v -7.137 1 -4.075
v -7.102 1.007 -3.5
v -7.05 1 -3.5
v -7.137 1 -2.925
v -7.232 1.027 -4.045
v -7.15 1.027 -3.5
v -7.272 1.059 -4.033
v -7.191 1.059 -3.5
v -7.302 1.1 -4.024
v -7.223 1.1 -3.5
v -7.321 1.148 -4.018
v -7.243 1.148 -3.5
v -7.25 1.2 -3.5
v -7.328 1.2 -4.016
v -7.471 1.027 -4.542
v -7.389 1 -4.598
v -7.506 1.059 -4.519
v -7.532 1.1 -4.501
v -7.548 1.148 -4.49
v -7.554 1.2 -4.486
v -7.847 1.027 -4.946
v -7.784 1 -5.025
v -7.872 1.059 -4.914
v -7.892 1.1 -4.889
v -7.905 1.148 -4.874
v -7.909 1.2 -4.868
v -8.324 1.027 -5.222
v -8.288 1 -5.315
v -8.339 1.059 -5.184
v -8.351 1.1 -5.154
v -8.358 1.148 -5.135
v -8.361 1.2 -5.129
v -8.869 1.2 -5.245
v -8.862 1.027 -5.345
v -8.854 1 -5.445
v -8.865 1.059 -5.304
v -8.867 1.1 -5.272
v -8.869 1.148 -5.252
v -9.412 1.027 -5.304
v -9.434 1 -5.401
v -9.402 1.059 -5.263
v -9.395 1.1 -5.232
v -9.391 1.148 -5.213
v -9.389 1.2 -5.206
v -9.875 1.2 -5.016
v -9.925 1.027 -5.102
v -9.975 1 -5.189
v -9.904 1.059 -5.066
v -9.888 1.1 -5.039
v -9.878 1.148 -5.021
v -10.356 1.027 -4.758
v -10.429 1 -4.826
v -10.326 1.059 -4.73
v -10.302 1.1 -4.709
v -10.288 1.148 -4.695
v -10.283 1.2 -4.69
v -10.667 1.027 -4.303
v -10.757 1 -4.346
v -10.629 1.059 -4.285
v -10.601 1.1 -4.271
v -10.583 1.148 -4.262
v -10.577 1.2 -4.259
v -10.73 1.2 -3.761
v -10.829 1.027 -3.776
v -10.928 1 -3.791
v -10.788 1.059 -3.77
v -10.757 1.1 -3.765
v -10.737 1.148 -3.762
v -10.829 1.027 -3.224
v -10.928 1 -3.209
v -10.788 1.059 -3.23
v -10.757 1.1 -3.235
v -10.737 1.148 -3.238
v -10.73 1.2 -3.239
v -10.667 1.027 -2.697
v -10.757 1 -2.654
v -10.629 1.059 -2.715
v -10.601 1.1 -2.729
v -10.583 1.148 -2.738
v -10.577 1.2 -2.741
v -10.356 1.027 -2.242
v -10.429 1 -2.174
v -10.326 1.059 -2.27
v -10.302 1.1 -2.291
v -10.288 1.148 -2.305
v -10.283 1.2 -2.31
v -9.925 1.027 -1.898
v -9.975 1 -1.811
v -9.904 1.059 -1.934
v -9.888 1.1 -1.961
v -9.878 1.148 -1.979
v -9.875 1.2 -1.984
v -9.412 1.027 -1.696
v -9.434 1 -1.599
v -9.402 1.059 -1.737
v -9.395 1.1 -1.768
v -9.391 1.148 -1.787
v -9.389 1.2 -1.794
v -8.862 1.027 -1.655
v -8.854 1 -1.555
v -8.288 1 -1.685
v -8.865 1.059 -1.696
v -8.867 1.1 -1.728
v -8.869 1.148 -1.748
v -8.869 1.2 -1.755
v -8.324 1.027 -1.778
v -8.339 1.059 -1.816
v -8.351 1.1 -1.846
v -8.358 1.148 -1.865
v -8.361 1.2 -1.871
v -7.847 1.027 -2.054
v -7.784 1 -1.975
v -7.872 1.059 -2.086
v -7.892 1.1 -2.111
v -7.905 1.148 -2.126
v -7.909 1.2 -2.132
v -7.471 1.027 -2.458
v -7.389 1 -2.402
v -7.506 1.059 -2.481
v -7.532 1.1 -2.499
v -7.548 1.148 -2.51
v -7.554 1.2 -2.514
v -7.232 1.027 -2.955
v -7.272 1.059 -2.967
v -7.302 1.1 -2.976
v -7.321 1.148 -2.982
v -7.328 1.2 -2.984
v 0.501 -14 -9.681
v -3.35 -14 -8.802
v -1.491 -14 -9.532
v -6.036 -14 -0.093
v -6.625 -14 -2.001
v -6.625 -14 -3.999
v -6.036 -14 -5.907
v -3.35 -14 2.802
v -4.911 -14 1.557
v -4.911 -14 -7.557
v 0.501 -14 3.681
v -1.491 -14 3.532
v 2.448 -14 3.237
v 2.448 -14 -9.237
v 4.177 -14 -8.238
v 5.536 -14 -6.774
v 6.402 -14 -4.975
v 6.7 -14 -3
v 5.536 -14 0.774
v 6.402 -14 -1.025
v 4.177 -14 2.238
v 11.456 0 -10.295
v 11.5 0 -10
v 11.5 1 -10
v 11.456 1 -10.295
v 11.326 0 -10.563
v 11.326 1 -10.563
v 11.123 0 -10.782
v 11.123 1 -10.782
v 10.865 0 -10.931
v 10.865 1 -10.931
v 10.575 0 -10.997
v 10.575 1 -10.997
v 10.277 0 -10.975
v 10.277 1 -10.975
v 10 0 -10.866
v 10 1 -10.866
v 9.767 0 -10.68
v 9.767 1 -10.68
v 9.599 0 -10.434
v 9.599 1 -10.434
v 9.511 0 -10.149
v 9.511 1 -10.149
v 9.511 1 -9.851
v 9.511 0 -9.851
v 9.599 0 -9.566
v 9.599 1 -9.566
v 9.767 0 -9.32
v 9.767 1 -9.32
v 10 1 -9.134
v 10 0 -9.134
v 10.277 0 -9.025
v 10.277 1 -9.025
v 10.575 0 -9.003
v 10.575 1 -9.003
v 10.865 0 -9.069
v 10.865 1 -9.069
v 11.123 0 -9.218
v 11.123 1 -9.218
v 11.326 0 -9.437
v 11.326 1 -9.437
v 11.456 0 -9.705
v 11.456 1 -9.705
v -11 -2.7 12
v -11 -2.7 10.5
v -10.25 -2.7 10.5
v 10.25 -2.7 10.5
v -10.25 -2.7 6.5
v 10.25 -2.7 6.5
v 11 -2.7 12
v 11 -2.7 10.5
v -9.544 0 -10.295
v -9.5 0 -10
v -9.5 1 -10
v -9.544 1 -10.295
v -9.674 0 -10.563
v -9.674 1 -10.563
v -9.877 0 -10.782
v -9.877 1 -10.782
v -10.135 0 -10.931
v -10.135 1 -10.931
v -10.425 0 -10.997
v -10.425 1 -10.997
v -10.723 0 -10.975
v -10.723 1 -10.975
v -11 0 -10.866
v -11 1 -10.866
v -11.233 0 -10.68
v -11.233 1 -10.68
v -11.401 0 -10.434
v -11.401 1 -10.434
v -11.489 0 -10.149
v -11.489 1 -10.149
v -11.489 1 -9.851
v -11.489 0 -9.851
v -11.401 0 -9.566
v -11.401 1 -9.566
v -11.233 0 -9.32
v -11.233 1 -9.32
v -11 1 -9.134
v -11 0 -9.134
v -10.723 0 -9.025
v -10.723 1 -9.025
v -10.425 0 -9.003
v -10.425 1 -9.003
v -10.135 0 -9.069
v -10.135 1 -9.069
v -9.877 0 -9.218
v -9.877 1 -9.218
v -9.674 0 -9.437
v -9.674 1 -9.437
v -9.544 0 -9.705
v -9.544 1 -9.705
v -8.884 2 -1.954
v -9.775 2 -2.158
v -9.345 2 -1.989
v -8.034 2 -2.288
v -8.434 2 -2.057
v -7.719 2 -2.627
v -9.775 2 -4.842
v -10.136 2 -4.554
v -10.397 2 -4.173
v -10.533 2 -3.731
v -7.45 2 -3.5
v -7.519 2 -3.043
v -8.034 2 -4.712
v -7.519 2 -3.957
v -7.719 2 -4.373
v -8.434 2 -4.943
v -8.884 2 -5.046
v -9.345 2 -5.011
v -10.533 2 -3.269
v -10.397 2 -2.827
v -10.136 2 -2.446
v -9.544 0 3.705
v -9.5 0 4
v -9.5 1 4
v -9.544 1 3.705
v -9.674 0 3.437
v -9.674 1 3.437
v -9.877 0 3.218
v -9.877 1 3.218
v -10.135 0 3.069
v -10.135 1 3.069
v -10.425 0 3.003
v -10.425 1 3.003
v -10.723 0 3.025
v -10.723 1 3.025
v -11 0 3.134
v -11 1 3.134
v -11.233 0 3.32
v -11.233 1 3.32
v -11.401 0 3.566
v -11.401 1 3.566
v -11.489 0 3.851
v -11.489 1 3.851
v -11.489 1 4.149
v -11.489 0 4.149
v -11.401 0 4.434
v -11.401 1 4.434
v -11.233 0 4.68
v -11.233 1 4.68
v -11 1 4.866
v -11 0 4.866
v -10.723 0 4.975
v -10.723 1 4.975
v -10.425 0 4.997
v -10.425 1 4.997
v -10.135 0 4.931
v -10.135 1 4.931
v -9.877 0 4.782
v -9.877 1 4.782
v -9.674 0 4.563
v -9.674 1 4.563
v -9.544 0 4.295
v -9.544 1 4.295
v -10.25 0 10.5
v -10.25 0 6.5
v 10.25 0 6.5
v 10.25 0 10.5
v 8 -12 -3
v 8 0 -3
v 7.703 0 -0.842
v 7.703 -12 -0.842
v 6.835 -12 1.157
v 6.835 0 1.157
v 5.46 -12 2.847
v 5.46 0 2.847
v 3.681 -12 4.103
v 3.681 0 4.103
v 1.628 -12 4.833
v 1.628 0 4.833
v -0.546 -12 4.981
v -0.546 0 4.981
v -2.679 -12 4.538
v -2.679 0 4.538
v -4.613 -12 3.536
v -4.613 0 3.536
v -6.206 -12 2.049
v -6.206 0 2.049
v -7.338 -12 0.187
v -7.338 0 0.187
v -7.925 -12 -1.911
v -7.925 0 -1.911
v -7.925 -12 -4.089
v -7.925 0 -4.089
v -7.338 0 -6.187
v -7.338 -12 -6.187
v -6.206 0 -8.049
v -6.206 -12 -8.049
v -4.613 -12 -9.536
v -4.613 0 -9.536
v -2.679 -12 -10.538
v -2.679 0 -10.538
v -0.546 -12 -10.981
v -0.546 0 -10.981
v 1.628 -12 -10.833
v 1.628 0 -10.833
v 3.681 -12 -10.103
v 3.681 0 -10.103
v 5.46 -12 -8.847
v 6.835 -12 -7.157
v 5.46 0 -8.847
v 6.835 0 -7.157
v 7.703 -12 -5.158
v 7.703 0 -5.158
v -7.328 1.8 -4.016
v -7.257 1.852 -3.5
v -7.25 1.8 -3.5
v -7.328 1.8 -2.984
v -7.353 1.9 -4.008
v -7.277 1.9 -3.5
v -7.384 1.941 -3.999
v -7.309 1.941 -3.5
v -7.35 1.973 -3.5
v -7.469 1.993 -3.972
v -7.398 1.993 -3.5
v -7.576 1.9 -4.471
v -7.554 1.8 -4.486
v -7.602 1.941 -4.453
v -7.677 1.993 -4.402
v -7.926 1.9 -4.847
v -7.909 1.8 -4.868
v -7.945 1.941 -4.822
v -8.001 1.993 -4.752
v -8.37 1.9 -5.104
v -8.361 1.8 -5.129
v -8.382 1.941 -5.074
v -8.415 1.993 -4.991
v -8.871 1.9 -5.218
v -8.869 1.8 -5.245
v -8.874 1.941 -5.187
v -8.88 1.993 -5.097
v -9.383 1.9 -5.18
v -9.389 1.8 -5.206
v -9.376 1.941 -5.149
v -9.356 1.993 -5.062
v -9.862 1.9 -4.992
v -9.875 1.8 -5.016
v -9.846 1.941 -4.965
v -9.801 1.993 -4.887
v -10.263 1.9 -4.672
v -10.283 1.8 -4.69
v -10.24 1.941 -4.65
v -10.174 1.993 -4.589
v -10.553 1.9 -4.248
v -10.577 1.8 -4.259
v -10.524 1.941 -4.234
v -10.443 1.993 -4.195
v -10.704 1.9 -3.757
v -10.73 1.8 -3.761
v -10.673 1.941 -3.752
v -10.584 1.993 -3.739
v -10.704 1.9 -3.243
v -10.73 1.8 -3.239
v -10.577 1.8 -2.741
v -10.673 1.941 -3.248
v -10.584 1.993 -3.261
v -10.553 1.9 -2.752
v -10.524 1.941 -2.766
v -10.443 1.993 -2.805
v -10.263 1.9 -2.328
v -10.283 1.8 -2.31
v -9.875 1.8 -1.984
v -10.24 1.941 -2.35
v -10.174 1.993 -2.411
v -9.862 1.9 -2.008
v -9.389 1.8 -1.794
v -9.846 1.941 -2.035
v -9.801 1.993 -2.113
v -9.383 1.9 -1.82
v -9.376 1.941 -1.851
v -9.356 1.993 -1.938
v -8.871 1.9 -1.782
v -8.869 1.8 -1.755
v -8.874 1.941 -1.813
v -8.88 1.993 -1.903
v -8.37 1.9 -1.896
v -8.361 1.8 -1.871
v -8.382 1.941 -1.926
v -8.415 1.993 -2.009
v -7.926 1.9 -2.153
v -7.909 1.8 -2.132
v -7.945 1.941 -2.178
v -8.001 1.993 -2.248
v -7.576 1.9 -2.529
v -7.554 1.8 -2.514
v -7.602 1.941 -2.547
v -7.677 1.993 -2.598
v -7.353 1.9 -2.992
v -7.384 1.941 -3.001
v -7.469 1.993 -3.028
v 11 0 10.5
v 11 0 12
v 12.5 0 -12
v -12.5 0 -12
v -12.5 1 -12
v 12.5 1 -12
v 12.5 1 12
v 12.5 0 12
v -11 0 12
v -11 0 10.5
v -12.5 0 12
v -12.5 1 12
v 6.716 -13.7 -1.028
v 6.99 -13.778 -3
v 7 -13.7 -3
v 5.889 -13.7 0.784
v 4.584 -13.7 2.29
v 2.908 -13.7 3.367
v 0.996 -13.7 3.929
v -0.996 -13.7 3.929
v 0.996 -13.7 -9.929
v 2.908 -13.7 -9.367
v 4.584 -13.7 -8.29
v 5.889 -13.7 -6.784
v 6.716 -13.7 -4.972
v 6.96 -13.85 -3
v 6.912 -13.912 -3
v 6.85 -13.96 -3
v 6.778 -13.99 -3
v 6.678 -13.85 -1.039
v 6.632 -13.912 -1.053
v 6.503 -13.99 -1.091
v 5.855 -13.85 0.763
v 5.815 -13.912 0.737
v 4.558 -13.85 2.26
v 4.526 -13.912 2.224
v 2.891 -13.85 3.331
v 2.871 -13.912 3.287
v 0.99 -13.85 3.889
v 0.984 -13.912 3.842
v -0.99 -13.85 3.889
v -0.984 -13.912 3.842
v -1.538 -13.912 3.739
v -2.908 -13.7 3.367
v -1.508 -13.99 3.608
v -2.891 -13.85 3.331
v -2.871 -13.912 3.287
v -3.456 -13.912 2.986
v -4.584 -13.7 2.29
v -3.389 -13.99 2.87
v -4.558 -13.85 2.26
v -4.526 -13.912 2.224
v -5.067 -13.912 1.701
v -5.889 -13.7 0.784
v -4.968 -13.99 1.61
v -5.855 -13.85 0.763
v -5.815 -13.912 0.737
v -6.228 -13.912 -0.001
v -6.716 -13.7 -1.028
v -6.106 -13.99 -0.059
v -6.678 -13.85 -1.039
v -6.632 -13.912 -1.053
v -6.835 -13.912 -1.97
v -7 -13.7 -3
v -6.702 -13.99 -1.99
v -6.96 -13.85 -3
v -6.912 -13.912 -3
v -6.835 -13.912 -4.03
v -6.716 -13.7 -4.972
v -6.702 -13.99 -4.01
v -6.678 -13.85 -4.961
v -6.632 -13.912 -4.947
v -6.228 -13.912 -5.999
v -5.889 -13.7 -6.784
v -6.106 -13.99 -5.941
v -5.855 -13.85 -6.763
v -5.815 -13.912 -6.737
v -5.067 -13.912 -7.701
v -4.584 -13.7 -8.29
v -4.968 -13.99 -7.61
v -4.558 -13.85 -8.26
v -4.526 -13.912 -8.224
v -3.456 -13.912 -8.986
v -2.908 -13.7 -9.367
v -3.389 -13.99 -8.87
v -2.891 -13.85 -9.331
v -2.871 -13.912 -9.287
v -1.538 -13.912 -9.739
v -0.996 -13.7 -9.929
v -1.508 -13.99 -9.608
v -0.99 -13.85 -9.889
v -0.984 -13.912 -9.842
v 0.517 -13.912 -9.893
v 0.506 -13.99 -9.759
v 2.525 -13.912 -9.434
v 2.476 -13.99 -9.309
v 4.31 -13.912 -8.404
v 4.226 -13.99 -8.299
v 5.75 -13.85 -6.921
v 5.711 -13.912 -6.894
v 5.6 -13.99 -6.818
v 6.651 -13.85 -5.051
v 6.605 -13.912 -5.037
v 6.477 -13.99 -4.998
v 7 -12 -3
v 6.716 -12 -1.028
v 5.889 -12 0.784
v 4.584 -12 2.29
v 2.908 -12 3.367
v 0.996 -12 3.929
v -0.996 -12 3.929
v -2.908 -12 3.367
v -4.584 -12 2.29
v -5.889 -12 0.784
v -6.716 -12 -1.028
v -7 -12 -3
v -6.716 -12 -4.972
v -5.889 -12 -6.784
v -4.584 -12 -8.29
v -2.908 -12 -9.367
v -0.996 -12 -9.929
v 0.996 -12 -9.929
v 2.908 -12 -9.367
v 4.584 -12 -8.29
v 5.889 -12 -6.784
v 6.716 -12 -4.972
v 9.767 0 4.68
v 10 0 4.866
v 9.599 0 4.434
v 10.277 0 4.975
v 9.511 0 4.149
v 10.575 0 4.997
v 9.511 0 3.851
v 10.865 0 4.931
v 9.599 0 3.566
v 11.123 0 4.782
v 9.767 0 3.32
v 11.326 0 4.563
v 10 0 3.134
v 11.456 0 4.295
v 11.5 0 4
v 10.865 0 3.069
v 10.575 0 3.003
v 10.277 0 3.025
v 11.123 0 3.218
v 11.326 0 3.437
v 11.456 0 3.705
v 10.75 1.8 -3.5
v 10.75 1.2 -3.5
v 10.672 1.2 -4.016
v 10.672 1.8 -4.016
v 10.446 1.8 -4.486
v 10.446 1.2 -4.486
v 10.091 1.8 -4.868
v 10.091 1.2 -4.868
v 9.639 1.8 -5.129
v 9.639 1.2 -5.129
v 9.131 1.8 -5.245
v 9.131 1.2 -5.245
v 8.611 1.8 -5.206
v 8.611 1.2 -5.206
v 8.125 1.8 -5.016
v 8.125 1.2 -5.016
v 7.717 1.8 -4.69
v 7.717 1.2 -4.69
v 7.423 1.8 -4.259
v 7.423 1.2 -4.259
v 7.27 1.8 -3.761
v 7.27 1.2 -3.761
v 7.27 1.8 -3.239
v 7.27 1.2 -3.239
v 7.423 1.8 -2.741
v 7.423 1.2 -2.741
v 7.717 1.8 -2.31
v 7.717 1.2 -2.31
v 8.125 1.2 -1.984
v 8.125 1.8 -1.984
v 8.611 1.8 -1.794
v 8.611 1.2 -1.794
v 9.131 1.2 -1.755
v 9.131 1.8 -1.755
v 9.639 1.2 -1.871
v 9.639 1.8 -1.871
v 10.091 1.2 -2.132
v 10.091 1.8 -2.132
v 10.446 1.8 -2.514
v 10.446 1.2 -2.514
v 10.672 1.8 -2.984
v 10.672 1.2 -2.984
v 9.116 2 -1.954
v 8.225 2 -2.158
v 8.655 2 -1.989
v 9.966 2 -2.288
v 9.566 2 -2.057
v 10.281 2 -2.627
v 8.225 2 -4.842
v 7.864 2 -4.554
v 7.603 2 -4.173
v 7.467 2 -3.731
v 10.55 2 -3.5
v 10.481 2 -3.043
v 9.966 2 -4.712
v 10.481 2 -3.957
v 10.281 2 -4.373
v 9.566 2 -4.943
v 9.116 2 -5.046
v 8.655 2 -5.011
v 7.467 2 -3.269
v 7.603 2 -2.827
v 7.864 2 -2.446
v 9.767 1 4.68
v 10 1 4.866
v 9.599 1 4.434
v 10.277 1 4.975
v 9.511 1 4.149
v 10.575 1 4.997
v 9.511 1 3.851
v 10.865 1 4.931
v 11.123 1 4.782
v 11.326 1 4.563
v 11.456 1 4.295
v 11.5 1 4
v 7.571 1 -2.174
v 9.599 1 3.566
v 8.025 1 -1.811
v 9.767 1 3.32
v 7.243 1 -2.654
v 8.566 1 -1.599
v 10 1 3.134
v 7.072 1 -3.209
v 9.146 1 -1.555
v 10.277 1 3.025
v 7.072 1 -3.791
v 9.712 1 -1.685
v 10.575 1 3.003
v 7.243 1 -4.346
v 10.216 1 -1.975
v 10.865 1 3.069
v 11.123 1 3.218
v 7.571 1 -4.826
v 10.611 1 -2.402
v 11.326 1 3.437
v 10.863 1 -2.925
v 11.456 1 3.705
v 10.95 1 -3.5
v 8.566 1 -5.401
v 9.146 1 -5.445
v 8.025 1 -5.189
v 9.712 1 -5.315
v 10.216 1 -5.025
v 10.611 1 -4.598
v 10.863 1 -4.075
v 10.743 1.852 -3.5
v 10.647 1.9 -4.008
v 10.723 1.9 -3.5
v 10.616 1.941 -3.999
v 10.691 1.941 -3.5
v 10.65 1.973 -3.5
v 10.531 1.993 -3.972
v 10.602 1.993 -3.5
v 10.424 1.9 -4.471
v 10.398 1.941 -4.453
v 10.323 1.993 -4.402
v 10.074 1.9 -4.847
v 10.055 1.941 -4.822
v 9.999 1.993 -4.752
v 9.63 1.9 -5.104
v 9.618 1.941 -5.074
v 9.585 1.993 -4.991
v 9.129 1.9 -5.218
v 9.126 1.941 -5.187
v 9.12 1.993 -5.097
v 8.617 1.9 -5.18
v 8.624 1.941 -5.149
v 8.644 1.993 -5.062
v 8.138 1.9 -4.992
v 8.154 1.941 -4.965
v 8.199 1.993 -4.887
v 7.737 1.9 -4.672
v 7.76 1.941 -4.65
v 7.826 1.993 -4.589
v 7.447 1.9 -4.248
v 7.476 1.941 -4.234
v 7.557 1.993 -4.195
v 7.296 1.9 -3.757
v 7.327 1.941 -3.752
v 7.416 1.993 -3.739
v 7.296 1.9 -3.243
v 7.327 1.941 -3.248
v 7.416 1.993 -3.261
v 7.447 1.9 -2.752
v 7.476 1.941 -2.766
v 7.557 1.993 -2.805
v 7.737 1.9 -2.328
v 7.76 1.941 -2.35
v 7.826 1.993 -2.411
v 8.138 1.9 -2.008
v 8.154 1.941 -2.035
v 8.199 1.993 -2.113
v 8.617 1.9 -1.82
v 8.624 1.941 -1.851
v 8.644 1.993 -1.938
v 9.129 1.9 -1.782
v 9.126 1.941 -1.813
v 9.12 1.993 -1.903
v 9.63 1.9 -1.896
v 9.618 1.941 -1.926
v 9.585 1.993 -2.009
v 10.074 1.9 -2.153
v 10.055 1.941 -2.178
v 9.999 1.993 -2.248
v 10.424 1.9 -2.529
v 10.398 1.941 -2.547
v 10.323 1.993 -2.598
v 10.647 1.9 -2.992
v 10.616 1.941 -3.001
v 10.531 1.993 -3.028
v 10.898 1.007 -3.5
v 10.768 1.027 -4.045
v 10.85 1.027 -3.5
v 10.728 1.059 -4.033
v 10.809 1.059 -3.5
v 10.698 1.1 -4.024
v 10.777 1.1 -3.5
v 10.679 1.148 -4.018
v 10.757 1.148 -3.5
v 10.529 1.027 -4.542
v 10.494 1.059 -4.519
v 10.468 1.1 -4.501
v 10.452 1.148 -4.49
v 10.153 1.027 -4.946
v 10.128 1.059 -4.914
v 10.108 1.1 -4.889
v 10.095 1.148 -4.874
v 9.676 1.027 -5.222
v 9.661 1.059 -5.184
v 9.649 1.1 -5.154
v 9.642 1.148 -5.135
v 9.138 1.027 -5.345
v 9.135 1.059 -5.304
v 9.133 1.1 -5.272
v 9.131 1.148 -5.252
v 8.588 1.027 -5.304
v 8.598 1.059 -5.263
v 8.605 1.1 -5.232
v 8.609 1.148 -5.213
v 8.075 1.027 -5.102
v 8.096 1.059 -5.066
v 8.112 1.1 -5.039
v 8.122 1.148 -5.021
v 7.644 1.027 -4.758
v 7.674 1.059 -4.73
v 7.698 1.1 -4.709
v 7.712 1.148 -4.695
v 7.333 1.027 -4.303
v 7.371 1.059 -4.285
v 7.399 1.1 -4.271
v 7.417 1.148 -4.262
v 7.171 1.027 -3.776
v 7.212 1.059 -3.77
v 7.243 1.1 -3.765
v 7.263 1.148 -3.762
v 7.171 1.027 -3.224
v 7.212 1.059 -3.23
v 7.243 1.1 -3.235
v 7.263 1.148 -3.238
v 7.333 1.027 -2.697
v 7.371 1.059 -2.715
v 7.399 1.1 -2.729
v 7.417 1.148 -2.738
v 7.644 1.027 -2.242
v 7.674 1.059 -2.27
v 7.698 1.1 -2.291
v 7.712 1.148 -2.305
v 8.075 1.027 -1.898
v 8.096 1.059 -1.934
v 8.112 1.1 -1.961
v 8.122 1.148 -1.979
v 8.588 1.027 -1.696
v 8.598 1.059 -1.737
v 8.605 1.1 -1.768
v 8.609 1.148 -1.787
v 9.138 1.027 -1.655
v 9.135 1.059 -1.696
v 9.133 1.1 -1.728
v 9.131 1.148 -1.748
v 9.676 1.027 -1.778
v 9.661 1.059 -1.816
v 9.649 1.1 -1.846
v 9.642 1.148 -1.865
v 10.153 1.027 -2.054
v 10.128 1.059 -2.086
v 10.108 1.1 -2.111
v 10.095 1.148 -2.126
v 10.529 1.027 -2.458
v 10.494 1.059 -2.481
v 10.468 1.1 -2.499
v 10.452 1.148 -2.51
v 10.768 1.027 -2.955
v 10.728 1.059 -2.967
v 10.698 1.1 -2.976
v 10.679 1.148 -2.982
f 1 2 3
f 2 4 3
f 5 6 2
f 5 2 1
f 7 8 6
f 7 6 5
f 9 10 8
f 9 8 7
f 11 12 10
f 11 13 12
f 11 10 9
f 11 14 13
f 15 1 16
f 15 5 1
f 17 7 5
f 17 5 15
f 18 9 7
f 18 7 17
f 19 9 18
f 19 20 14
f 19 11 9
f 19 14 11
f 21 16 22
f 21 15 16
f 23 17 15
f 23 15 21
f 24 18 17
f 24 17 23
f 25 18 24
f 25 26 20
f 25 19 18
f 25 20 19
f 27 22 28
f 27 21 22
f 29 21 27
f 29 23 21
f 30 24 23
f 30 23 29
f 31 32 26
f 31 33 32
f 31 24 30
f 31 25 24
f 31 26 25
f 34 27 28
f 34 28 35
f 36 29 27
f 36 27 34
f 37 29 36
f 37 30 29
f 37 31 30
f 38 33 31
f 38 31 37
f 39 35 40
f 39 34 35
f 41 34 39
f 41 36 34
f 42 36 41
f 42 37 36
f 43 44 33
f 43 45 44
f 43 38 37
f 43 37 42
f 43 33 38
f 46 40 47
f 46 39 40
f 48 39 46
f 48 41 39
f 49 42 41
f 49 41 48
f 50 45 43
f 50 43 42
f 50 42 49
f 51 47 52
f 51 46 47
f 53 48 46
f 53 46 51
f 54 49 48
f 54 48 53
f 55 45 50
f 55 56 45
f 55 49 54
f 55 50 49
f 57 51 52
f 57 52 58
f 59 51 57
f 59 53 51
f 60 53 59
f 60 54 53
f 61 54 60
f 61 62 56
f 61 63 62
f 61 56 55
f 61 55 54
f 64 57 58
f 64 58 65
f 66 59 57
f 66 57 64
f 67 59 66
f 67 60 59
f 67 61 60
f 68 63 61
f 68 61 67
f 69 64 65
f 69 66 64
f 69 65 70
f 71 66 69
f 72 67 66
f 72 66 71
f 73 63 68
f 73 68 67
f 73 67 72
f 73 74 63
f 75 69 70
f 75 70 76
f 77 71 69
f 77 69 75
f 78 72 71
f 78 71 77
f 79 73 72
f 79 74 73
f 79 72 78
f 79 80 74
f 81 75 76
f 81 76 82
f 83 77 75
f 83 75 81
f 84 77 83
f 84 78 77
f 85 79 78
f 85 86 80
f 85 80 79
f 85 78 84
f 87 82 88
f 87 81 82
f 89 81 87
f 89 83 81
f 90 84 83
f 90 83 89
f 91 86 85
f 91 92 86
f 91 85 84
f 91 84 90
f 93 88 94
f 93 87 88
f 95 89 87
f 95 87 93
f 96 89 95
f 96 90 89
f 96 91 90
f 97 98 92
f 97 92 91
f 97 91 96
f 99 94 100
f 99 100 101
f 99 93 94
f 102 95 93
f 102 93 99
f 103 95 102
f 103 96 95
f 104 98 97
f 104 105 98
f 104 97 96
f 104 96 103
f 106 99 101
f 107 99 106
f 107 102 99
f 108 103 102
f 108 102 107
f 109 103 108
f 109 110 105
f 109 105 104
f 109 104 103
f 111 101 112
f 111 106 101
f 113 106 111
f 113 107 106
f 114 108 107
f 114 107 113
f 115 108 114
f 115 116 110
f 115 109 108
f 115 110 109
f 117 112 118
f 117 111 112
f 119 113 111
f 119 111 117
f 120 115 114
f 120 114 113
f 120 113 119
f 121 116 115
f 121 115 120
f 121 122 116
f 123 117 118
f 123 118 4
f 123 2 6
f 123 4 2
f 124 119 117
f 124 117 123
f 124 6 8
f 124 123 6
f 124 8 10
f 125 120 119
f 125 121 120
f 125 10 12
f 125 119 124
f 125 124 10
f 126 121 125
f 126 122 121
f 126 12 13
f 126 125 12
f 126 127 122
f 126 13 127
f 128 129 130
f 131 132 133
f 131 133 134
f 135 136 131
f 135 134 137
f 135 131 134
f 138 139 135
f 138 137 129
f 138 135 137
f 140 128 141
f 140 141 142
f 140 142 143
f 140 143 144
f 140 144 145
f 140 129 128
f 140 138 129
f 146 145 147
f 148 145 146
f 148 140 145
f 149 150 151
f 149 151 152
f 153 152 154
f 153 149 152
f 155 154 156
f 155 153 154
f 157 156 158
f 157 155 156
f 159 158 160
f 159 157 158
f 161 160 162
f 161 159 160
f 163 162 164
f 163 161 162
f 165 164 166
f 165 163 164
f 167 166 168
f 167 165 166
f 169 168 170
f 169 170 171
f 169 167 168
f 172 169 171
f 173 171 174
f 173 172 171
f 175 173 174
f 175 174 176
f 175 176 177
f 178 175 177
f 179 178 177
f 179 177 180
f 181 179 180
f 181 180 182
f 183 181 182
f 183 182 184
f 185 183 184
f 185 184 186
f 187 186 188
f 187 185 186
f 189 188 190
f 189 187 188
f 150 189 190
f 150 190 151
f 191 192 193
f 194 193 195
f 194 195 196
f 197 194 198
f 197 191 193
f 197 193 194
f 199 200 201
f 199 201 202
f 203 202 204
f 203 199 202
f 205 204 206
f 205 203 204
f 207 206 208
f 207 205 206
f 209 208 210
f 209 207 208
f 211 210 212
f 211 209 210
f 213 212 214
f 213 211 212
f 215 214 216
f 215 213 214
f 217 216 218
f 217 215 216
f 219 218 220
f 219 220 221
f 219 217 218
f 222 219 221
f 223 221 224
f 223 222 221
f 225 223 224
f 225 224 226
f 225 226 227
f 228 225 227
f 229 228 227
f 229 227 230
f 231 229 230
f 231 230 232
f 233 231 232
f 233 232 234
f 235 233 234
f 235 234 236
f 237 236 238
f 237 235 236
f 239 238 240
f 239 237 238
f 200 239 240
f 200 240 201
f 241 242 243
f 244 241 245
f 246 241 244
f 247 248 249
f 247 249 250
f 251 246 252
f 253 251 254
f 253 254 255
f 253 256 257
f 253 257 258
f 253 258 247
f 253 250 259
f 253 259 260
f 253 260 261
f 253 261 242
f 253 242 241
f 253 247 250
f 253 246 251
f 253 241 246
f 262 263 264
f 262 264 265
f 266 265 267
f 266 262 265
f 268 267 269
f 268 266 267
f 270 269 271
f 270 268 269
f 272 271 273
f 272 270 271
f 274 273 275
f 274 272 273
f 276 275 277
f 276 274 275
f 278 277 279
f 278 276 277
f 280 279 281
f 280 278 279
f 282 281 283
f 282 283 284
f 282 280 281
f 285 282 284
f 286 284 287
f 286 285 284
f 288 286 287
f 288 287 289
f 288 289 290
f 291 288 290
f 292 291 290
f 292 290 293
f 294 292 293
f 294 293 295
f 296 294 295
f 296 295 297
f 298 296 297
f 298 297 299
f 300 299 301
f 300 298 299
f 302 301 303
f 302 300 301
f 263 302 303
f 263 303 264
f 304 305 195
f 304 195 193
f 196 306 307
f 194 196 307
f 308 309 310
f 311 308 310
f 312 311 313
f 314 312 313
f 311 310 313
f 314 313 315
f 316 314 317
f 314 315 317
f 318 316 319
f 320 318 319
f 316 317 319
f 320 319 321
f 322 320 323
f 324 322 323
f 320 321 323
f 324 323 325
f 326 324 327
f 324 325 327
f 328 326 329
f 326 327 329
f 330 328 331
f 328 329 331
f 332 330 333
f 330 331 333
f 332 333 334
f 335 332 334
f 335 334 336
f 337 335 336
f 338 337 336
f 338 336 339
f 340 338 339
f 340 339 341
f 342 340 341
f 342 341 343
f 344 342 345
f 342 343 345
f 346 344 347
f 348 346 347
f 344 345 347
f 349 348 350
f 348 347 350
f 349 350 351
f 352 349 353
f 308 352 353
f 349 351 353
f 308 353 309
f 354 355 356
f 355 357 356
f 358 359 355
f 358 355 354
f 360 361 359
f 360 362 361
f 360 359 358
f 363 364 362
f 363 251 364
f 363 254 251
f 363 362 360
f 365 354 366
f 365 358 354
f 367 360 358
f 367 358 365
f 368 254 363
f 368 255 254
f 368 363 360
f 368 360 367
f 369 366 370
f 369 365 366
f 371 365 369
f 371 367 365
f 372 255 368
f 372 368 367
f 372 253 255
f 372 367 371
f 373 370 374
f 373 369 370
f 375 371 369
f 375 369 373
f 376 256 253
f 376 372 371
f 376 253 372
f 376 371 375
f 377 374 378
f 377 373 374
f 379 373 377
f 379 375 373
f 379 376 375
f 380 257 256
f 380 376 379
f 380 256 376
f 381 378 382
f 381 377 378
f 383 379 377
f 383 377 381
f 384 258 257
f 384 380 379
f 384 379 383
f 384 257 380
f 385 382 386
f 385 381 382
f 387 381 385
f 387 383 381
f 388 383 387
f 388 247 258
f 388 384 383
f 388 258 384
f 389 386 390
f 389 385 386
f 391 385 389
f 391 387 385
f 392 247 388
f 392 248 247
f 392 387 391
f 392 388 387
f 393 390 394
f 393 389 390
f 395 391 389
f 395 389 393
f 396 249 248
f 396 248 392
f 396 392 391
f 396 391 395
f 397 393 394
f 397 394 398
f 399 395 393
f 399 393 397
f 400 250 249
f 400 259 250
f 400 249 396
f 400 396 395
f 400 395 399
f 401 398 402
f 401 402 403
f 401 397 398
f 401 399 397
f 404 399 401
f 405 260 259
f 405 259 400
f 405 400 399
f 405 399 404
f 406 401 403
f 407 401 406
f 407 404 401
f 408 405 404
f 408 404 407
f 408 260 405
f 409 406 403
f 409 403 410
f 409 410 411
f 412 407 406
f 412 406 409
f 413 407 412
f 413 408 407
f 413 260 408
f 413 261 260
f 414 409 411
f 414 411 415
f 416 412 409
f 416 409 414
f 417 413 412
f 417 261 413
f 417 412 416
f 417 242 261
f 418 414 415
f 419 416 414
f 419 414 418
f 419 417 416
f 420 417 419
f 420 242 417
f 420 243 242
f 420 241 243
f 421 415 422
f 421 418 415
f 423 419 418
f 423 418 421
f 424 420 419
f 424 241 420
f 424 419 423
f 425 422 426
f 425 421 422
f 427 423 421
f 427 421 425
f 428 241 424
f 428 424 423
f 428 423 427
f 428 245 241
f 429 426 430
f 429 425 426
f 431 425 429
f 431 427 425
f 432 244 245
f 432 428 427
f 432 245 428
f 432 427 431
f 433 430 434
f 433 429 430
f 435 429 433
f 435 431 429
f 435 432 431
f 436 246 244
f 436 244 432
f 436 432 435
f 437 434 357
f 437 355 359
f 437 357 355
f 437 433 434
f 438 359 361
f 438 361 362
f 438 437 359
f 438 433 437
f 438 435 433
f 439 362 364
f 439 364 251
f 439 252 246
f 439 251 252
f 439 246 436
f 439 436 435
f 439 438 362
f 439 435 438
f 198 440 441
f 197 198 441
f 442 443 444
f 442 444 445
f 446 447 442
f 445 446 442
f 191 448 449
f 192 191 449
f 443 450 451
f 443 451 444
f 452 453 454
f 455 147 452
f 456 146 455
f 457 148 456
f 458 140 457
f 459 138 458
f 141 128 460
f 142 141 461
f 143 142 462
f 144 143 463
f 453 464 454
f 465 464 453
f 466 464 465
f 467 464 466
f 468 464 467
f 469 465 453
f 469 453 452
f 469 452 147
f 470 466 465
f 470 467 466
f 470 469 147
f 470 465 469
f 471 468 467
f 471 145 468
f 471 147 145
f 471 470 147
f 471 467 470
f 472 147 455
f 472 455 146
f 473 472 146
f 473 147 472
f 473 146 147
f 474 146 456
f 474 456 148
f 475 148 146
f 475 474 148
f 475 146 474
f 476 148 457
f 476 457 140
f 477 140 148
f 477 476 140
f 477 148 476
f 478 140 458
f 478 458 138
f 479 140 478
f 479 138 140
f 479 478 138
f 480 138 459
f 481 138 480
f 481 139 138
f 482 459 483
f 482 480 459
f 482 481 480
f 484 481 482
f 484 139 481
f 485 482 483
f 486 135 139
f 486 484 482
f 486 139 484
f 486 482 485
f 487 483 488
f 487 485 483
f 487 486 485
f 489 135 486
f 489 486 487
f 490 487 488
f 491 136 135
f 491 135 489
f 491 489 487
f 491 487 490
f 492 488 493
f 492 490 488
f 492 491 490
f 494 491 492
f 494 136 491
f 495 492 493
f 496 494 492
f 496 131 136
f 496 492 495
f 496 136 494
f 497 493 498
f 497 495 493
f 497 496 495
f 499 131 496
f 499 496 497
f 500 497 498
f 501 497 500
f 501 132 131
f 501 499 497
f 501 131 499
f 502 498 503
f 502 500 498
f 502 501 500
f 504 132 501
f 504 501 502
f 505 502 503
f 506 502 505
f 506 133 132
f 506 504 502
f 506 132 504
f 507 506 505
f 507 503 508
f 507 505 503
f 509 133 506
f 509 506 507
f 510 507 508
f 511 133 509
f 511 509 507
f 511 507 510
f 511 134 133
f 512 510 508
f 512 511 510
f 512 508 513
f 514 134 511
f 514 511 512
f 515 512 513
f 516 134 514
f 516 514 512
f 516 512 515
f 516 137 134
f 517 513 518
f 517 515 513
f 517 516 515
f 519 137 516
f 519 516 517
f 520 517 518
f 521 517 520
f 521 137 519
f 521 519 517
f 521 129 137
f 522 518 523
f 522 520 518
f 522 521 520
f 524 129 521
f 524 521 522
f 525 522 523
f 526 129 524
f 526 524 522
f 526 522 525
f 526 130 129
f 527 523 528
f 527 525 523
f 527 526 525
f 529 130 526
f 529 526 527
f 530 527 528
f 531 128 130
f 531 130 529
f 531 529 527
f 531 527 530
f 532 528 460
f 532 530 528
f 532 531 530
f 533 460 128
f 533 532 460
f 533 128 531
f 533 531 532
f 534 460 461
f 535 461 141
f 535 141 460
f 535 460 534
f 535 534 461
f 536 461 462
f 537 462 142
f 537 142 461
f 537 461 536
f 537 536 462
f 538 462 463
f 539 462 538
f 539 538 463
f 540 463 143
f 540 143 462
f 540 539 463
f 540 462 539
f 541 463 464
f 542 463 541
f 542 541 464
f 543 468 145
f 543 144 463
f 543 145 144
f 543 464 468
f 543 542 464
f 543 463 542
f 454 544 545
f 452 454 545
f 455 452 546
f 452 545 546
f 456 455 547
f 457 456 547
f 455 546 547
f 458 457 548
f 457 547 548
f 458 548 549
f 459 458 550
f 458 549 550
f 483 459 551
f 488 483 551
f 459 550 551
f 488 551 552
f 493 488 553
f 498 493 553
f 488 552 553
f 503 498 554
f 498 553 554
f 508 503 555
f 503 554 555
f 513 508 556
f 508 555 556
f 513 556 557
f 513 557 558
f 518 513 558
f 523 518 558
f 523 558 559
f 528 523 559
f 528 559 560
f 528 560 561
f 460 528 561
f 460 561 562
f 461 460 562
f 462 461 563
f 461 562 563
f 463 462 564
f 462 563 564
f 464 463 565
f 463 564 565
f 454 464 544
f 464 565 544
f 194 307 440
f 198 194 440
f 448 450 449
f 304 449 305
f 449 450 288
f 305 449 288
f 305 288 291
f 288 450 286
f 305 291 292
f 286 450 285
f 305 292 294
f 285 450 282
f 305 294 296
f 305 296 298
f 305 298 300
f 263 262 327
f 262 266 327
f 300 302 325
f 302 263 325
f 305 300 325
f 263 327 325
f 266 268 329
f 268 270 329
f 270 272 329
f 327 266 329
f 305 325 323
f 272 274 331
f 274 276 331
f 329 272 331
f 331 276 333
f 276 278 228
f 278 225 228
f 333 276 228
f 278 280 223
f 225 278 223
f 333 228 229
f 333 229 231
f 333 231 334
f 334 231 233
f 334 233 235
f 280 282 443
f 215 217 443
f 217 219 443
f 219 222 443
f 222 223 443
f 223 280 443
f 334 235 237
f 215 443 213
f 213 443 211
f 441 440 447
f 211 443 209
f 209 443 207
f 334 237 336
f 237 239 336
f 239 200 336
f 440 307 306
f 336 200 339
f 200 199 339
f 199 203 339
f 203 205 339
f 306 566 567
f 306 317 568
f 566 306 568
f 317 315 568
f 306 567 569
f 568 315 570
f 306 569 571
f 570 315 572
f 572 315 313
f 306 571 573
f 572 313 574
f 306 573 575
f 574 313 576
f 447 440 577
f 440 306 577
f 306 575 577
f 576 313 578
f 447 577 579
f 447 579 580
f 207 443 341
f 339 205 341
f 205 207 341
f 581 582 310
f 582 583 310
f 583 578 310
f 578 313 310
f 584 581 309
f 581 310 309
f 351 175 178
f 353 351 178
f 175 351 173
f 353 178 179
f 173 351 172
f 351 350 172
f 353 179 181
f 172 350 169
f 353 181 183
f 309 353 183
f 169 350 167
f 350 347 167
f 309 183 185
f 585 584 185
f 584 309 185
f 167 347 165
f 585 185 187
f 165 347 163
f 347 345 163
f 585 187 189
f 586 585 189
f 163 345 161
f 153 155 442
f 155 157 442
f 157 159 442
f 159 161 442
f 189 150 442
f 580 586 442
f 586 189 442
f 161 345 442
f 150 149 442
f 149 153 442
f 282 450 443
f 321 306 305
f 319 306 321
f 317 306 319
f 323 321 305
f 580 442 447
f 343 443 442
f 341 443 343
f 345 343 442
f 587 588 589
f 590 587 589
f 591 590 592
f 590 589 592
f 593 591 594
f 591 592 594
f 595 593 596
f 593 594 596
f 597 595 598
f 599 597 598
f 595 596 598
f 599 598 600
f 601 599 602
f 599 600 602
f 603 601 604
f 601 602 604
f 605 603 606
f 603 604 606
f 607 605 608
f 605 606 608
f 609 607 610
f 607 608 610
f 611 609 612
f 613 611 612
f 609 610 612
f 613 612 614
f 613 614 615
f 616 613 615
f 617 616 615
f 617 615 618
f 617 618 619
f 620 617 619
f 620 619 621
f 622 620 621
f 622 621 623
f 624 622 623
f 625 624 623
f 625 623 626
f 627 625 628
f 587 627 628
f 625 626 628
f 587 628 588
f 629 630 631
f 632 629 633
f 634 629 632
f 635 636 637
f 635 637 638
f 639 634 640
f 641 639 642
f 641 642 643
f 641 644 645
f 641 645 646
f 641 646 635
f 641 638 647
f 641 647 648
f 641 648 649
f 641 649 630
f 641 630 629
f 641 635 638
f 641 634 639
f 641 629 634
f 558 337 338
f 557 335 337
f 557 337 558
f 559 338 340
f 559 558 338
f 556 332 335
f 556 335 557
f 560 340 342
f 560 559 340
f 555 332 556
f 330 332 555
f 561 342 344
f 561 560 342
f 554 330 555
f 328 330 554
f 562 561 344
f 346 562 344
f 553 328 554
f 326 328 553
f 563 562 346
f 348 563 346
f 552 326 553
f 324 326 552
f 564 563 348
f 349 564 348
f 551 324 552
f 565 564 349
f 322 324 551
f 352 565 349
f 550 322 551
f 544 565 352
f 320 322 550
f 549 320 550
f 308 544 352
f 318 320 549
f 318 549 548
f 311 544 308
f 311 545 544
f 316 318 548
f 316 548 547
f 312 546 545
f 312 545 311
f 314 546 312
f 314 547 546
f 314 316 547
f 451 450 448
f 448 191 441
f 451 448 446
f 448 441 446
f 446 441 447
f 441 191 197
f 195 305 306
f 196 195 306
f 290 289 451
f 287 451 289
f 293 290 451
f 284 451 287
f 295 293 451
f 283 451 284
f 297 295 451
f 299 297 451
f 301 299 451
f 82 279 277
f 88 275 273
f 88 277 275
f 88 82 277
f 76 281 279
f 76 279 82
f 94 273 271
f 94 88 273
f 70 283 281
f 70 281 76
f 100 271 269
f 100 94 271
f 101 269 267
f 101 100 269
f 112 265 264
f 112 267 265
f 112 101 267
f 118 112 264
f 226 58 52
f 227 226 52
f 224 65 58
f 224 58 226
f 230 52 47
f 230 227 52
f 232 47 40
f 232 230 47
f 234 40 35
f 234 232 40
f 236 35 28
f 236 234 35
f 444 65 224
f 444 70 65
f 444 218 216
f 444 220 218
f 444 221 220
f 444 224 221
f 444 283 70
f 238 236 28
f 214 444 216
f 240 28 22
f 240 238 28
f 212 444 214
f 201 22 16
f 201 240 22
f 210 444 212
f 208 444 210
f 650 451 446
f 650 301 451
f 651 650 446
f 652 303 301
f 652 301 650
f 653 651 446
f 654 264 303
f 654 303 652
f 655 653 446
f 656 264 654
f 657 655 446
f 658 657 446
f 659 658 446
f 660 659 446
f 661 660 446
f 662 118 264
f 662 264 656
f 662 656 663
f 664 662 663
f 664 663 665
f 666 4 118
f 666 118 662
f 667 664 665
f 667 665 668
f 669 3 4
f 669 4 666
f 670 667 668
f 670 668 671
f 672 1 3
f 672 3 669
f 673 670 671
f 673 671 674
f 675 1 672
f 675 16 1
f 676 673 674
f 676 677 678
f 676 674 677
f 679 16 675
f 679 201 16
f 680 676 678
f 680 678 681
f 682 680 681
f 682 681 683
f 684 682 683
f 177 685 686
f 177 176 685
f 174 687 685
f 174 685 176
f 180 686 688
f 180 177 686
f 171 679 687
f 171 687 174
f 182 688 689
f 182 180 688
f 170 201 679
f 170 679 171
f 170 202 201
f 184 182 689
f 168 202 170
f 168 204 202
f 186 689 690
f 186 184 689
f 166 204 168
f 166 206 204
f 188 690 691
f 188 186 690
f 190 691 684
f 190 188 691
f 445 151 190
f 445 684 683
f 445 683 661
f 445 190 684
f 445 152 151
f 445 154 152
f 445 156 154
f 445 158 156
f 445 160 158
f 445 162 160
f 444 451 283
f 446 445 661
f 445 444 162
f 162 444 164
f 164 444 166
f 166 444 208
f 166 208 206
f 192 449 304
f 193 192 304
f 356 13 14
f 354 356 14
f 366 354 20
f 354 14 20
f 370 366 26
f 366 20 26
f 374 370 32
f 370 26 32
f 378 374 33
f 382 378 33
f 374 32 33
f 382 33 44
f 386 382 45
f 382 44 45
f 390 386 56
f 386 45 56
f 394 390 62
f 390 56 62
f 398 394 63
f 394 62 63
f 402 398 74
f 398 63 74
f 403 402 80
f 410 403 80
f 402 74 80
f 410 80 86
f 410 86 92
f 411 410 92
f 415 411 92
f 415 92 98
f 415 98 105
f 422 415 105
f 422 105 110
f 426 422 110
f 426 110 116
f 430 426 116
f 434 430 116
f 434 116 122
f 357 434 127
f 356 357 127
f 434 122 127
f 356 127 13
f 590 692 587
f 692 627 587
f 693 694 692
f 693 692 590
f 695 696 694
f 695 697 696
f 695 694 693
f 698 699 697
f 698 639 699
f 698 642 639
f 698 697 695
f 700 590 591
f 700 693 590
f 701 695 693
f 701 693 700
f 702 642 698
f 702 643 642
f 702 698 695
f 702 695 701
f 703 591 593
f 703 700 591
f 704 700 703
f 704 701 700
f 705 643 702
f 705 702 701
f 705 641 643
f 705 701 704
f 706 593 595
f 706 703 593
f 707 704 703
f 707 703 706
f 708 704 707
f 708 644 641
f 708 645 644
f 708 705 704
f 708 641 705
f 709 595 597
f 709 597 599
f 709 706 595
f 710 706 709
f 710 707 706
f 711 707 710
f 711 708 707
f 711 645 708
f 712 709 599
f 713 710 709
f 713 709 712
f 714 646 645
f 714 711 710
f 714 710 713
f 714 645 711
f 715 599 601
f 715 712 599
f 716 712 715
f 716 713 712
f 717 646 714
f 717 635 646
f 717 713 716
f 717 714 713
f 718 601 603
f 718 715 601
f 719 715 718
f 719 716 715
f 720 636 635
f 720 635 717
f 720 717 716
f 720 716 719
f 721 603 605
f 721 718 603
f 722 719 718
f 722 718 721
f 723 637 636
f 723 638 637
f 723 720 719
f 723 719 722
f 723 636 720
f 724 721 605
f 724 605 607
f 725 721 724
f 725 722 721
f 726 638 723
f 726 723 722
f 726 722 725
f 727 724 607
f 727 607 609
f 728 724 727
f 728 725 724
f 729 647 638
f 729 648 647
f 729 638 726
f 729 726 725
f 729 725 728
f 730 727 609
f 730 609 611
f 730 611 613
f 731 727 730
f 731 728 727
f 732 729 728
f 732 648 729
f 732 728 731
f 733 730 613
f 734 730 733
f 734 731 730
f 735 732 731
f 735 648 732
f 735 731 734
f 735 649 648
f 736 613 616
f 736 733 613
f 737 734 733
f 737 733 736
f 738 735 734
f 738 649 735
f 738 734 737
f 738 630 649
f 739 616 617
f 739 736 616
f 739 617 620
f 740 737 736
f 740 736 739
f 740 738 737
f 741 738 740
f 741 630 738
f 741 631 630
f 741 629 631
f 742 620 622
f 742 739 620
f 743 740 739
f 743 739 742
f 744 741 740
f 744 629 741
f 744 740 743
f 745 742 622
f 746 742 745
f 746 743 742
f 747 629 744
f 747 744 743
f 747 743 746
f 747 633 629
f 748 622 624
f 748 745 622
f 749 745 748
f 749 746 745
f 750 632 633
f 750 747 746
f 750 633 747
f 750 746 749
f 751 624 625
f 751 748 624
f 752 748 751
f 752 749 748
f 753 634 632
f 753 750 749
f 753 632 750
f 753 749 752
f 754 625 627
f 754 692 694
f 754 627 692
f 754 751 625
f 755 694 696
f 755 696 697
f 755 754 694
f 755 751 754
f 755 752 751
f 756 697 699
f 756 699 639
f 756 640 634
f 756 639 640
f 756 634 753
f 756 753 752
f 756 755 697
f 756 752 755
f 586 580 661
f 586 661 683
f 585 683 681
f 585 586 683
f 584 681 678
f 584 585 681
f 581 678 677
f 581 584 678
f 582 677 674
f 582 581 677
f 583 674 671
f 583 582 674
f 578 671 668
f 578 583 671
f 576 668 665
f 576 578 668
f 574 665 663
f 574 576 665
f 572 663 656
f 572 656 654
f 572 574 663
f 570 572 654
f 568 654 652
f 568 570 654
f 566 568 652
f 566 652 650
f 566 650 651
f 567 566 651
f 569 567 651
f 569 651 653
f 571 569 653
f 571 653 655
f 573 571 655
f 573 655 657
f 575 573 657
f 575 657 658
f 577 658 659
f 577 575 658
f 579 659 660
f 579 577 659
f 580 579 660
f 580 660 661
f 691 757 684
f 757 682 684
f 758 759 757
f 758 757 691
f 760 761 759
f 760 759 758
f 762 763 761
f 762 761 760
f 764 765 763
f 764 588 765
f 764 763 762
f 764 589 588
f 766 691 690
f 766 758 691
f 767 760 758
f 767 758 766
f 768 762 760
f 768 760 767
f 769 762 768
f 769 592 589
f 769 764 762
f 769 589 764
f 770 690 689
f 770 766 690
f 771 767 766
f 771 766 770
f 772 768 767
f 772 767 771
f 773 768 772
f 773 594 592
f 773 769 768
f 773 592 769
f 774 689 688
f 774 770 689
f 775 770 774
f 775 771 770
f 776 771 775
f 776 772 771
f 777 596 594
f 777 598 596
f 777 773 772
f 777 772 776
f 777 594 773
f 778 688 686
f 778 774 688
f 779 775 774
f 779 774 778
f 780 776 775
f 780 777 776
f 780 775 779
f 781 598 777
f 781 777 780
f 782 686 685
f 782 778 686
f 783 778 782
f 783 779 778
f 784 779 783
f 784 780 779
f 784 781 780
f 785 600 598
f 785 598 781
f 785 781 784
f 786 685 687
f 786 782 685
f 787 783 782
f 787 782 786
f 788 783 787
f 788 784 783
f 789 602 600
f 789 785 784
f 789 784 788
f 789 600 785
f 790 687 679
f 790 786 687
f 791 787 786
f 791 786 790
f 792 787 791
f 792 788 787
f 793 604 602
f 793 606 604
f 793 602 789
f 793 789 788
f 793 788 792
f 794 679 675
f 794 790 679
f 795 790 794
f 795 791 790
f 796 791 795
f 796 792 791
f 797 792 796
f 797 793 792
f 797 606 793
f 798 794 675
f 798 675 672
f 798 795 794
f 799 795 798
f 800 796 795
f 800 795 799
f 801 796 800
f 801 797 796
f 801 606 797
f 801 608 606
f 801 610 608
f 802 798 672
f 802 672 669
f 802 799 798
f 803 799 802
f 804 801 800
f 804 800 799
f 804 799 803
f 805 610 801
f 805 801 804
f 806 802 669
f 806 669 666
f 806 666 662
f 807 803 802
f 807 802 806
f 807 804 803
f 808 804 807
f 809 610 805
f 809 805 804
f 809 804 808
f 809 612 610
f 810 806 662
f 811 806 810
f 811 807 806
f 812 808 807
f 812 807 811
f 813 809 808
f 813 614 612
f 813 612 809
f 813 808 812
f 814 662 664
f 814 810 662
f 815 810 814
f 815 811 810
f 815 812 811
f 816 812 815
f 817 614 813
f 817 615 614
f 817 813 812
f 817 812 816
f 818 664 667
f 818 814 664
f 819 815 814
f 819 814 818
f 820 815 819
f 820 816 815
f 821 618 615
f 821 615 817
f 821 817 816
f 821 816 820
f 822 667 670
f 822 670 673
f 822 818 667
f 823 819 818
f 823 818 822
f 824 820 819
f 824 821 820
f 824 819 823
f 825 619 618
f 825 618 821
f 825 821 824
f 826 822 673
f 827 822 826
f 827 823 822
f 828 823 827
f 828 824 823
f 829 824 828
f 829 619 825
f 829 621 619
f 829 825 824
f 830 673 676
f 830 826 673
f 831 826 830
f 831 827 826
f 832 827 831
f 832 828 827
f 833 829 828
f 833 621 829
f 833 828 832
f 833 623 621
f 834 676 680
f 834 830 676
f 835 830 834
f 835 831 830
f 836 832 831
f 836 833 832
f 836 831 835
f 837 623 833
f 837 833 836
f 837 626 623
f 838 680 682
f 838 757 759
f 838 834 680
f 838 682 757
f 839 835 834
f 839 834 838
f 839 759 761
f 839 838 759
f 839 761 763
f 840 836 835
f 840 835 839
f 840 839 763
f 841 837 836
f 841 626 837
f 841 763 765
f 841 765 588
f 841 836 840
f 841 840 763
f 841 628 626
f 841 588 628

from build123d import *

# Parameters (mm, degrees)
SKETCH_1_W      = 25
SKETCH_1_H      = 24
SKETCH_1_R      = 1
EXTRUDE_1_DEPTH = 1
SKETCH_2_R      = 1.75
EXTRUDE_2_DEPTH = 1
FILLET_1_R      = 0.2
SKETCH_3_W      = 20.5
SKETCH_3_H      = 4
EXTRUDE_3_DEPTH = 2.7
SKETCH_4_R      = 8
EXTRUDE_4_DEPTH = 12
SKETCH_5_R      = 7
EXTRUDE_5_DEPTH = 2
FILLET_2_R      = 0.3


with BuildPart() as part:
    # Эскиз1 → Бобышка-Вытянуть1 (new body)
    with BuildSketch(Plane(origin=(0, 0, 0), x_dir=(1, 0, 0), z_dir=(0, 1, 0))):
        Rectangle(SKETCH_1_W, SKETCH_1_H)
        with Locations((-10.5, 10)):
            Circle(SKETCH_1_R, mode=Mode.SUBTRACT)
        with Locations((10.5, 10)):
            Circle(SKETCH_1_R, mode=Mode.SUBTRACT)
        with Locations((10.5, -4)):
            Circle(SKETCH_1_R, mode=Mode.SUBTRACT)
        with Locations((-10.5, -4)):
            Circle(SKETCH_1_R, mode=Mode.SUBTRACT)
    extrude(amount=EXTRUDE_1_DEPTH)

    # Эскиз2 → Бобышка-Вытянуть2 (add)
    with BuildSketch(Plane(origin=(0, 1, 0), x_dir=(1, 0, 0), z_dir=(0, 1, 0))):
        with Locations((-9, 3.5)):
            Circle(SKETCH_2_R)
        with Locations((9, 3.5)):
            Circle(SKETCH_2_R)
    extrude(amount=EXTRUDE_2_DEPTH)

    # Скругление1
    fillet_1_edges = [part.edges().sort_by_distance(p)[0] for p in [
        (-10.75, 1, -3.5),
        (-10.75, 2, -3.5),
        (7.25, 1, -3.5),
        (7.25, 2, -3.5),
    ]]
    fillet(fillet_1_edges, radius=FILLET_1_R)

    # Эскиз3 → Бобышка-Вытянуть3 (add)
    with BuildSketch(Plane.XZ):
        with Locations((0, 8.5)):
            Rectangle(SKETCH_3_W, SKETCH_3_H)
        Polygon((-11, 10.5), (-10.25, 10.5), (10.25, 10.5), (11, 10.5), (11, 12), (-11, 12), align=None)
    extrude(amount=EXTRUDE_3_DEPTH)

    # Эскиз4 → Бобышка-Вытянуть4 (add)
    with BuildSketch(Plane.XZ):
        with Locations((0, -3)):
            Circle(SKETCH_4_R)
    extrude(amount=EXTRUDE_4_DEPTH)

    # Эскиз5 → Бобышка-Вытянуть5 (add)
    with BuildSketch(Plane.XZ.offset(12)):
        with Locations((0, -3)):
            Circle(SKETCH_5_R)
    extrude(amount=EXTRUDE_5_DEPTH)

    # Скругление2
    fillet_2_edges = [part.edges().sort_by_distance(p)[0] for p in [
        (-7, -14, -3),
    ]]
    fillet(fillet_2_edges, radius=FILLET_2_R)


solid = part.part
